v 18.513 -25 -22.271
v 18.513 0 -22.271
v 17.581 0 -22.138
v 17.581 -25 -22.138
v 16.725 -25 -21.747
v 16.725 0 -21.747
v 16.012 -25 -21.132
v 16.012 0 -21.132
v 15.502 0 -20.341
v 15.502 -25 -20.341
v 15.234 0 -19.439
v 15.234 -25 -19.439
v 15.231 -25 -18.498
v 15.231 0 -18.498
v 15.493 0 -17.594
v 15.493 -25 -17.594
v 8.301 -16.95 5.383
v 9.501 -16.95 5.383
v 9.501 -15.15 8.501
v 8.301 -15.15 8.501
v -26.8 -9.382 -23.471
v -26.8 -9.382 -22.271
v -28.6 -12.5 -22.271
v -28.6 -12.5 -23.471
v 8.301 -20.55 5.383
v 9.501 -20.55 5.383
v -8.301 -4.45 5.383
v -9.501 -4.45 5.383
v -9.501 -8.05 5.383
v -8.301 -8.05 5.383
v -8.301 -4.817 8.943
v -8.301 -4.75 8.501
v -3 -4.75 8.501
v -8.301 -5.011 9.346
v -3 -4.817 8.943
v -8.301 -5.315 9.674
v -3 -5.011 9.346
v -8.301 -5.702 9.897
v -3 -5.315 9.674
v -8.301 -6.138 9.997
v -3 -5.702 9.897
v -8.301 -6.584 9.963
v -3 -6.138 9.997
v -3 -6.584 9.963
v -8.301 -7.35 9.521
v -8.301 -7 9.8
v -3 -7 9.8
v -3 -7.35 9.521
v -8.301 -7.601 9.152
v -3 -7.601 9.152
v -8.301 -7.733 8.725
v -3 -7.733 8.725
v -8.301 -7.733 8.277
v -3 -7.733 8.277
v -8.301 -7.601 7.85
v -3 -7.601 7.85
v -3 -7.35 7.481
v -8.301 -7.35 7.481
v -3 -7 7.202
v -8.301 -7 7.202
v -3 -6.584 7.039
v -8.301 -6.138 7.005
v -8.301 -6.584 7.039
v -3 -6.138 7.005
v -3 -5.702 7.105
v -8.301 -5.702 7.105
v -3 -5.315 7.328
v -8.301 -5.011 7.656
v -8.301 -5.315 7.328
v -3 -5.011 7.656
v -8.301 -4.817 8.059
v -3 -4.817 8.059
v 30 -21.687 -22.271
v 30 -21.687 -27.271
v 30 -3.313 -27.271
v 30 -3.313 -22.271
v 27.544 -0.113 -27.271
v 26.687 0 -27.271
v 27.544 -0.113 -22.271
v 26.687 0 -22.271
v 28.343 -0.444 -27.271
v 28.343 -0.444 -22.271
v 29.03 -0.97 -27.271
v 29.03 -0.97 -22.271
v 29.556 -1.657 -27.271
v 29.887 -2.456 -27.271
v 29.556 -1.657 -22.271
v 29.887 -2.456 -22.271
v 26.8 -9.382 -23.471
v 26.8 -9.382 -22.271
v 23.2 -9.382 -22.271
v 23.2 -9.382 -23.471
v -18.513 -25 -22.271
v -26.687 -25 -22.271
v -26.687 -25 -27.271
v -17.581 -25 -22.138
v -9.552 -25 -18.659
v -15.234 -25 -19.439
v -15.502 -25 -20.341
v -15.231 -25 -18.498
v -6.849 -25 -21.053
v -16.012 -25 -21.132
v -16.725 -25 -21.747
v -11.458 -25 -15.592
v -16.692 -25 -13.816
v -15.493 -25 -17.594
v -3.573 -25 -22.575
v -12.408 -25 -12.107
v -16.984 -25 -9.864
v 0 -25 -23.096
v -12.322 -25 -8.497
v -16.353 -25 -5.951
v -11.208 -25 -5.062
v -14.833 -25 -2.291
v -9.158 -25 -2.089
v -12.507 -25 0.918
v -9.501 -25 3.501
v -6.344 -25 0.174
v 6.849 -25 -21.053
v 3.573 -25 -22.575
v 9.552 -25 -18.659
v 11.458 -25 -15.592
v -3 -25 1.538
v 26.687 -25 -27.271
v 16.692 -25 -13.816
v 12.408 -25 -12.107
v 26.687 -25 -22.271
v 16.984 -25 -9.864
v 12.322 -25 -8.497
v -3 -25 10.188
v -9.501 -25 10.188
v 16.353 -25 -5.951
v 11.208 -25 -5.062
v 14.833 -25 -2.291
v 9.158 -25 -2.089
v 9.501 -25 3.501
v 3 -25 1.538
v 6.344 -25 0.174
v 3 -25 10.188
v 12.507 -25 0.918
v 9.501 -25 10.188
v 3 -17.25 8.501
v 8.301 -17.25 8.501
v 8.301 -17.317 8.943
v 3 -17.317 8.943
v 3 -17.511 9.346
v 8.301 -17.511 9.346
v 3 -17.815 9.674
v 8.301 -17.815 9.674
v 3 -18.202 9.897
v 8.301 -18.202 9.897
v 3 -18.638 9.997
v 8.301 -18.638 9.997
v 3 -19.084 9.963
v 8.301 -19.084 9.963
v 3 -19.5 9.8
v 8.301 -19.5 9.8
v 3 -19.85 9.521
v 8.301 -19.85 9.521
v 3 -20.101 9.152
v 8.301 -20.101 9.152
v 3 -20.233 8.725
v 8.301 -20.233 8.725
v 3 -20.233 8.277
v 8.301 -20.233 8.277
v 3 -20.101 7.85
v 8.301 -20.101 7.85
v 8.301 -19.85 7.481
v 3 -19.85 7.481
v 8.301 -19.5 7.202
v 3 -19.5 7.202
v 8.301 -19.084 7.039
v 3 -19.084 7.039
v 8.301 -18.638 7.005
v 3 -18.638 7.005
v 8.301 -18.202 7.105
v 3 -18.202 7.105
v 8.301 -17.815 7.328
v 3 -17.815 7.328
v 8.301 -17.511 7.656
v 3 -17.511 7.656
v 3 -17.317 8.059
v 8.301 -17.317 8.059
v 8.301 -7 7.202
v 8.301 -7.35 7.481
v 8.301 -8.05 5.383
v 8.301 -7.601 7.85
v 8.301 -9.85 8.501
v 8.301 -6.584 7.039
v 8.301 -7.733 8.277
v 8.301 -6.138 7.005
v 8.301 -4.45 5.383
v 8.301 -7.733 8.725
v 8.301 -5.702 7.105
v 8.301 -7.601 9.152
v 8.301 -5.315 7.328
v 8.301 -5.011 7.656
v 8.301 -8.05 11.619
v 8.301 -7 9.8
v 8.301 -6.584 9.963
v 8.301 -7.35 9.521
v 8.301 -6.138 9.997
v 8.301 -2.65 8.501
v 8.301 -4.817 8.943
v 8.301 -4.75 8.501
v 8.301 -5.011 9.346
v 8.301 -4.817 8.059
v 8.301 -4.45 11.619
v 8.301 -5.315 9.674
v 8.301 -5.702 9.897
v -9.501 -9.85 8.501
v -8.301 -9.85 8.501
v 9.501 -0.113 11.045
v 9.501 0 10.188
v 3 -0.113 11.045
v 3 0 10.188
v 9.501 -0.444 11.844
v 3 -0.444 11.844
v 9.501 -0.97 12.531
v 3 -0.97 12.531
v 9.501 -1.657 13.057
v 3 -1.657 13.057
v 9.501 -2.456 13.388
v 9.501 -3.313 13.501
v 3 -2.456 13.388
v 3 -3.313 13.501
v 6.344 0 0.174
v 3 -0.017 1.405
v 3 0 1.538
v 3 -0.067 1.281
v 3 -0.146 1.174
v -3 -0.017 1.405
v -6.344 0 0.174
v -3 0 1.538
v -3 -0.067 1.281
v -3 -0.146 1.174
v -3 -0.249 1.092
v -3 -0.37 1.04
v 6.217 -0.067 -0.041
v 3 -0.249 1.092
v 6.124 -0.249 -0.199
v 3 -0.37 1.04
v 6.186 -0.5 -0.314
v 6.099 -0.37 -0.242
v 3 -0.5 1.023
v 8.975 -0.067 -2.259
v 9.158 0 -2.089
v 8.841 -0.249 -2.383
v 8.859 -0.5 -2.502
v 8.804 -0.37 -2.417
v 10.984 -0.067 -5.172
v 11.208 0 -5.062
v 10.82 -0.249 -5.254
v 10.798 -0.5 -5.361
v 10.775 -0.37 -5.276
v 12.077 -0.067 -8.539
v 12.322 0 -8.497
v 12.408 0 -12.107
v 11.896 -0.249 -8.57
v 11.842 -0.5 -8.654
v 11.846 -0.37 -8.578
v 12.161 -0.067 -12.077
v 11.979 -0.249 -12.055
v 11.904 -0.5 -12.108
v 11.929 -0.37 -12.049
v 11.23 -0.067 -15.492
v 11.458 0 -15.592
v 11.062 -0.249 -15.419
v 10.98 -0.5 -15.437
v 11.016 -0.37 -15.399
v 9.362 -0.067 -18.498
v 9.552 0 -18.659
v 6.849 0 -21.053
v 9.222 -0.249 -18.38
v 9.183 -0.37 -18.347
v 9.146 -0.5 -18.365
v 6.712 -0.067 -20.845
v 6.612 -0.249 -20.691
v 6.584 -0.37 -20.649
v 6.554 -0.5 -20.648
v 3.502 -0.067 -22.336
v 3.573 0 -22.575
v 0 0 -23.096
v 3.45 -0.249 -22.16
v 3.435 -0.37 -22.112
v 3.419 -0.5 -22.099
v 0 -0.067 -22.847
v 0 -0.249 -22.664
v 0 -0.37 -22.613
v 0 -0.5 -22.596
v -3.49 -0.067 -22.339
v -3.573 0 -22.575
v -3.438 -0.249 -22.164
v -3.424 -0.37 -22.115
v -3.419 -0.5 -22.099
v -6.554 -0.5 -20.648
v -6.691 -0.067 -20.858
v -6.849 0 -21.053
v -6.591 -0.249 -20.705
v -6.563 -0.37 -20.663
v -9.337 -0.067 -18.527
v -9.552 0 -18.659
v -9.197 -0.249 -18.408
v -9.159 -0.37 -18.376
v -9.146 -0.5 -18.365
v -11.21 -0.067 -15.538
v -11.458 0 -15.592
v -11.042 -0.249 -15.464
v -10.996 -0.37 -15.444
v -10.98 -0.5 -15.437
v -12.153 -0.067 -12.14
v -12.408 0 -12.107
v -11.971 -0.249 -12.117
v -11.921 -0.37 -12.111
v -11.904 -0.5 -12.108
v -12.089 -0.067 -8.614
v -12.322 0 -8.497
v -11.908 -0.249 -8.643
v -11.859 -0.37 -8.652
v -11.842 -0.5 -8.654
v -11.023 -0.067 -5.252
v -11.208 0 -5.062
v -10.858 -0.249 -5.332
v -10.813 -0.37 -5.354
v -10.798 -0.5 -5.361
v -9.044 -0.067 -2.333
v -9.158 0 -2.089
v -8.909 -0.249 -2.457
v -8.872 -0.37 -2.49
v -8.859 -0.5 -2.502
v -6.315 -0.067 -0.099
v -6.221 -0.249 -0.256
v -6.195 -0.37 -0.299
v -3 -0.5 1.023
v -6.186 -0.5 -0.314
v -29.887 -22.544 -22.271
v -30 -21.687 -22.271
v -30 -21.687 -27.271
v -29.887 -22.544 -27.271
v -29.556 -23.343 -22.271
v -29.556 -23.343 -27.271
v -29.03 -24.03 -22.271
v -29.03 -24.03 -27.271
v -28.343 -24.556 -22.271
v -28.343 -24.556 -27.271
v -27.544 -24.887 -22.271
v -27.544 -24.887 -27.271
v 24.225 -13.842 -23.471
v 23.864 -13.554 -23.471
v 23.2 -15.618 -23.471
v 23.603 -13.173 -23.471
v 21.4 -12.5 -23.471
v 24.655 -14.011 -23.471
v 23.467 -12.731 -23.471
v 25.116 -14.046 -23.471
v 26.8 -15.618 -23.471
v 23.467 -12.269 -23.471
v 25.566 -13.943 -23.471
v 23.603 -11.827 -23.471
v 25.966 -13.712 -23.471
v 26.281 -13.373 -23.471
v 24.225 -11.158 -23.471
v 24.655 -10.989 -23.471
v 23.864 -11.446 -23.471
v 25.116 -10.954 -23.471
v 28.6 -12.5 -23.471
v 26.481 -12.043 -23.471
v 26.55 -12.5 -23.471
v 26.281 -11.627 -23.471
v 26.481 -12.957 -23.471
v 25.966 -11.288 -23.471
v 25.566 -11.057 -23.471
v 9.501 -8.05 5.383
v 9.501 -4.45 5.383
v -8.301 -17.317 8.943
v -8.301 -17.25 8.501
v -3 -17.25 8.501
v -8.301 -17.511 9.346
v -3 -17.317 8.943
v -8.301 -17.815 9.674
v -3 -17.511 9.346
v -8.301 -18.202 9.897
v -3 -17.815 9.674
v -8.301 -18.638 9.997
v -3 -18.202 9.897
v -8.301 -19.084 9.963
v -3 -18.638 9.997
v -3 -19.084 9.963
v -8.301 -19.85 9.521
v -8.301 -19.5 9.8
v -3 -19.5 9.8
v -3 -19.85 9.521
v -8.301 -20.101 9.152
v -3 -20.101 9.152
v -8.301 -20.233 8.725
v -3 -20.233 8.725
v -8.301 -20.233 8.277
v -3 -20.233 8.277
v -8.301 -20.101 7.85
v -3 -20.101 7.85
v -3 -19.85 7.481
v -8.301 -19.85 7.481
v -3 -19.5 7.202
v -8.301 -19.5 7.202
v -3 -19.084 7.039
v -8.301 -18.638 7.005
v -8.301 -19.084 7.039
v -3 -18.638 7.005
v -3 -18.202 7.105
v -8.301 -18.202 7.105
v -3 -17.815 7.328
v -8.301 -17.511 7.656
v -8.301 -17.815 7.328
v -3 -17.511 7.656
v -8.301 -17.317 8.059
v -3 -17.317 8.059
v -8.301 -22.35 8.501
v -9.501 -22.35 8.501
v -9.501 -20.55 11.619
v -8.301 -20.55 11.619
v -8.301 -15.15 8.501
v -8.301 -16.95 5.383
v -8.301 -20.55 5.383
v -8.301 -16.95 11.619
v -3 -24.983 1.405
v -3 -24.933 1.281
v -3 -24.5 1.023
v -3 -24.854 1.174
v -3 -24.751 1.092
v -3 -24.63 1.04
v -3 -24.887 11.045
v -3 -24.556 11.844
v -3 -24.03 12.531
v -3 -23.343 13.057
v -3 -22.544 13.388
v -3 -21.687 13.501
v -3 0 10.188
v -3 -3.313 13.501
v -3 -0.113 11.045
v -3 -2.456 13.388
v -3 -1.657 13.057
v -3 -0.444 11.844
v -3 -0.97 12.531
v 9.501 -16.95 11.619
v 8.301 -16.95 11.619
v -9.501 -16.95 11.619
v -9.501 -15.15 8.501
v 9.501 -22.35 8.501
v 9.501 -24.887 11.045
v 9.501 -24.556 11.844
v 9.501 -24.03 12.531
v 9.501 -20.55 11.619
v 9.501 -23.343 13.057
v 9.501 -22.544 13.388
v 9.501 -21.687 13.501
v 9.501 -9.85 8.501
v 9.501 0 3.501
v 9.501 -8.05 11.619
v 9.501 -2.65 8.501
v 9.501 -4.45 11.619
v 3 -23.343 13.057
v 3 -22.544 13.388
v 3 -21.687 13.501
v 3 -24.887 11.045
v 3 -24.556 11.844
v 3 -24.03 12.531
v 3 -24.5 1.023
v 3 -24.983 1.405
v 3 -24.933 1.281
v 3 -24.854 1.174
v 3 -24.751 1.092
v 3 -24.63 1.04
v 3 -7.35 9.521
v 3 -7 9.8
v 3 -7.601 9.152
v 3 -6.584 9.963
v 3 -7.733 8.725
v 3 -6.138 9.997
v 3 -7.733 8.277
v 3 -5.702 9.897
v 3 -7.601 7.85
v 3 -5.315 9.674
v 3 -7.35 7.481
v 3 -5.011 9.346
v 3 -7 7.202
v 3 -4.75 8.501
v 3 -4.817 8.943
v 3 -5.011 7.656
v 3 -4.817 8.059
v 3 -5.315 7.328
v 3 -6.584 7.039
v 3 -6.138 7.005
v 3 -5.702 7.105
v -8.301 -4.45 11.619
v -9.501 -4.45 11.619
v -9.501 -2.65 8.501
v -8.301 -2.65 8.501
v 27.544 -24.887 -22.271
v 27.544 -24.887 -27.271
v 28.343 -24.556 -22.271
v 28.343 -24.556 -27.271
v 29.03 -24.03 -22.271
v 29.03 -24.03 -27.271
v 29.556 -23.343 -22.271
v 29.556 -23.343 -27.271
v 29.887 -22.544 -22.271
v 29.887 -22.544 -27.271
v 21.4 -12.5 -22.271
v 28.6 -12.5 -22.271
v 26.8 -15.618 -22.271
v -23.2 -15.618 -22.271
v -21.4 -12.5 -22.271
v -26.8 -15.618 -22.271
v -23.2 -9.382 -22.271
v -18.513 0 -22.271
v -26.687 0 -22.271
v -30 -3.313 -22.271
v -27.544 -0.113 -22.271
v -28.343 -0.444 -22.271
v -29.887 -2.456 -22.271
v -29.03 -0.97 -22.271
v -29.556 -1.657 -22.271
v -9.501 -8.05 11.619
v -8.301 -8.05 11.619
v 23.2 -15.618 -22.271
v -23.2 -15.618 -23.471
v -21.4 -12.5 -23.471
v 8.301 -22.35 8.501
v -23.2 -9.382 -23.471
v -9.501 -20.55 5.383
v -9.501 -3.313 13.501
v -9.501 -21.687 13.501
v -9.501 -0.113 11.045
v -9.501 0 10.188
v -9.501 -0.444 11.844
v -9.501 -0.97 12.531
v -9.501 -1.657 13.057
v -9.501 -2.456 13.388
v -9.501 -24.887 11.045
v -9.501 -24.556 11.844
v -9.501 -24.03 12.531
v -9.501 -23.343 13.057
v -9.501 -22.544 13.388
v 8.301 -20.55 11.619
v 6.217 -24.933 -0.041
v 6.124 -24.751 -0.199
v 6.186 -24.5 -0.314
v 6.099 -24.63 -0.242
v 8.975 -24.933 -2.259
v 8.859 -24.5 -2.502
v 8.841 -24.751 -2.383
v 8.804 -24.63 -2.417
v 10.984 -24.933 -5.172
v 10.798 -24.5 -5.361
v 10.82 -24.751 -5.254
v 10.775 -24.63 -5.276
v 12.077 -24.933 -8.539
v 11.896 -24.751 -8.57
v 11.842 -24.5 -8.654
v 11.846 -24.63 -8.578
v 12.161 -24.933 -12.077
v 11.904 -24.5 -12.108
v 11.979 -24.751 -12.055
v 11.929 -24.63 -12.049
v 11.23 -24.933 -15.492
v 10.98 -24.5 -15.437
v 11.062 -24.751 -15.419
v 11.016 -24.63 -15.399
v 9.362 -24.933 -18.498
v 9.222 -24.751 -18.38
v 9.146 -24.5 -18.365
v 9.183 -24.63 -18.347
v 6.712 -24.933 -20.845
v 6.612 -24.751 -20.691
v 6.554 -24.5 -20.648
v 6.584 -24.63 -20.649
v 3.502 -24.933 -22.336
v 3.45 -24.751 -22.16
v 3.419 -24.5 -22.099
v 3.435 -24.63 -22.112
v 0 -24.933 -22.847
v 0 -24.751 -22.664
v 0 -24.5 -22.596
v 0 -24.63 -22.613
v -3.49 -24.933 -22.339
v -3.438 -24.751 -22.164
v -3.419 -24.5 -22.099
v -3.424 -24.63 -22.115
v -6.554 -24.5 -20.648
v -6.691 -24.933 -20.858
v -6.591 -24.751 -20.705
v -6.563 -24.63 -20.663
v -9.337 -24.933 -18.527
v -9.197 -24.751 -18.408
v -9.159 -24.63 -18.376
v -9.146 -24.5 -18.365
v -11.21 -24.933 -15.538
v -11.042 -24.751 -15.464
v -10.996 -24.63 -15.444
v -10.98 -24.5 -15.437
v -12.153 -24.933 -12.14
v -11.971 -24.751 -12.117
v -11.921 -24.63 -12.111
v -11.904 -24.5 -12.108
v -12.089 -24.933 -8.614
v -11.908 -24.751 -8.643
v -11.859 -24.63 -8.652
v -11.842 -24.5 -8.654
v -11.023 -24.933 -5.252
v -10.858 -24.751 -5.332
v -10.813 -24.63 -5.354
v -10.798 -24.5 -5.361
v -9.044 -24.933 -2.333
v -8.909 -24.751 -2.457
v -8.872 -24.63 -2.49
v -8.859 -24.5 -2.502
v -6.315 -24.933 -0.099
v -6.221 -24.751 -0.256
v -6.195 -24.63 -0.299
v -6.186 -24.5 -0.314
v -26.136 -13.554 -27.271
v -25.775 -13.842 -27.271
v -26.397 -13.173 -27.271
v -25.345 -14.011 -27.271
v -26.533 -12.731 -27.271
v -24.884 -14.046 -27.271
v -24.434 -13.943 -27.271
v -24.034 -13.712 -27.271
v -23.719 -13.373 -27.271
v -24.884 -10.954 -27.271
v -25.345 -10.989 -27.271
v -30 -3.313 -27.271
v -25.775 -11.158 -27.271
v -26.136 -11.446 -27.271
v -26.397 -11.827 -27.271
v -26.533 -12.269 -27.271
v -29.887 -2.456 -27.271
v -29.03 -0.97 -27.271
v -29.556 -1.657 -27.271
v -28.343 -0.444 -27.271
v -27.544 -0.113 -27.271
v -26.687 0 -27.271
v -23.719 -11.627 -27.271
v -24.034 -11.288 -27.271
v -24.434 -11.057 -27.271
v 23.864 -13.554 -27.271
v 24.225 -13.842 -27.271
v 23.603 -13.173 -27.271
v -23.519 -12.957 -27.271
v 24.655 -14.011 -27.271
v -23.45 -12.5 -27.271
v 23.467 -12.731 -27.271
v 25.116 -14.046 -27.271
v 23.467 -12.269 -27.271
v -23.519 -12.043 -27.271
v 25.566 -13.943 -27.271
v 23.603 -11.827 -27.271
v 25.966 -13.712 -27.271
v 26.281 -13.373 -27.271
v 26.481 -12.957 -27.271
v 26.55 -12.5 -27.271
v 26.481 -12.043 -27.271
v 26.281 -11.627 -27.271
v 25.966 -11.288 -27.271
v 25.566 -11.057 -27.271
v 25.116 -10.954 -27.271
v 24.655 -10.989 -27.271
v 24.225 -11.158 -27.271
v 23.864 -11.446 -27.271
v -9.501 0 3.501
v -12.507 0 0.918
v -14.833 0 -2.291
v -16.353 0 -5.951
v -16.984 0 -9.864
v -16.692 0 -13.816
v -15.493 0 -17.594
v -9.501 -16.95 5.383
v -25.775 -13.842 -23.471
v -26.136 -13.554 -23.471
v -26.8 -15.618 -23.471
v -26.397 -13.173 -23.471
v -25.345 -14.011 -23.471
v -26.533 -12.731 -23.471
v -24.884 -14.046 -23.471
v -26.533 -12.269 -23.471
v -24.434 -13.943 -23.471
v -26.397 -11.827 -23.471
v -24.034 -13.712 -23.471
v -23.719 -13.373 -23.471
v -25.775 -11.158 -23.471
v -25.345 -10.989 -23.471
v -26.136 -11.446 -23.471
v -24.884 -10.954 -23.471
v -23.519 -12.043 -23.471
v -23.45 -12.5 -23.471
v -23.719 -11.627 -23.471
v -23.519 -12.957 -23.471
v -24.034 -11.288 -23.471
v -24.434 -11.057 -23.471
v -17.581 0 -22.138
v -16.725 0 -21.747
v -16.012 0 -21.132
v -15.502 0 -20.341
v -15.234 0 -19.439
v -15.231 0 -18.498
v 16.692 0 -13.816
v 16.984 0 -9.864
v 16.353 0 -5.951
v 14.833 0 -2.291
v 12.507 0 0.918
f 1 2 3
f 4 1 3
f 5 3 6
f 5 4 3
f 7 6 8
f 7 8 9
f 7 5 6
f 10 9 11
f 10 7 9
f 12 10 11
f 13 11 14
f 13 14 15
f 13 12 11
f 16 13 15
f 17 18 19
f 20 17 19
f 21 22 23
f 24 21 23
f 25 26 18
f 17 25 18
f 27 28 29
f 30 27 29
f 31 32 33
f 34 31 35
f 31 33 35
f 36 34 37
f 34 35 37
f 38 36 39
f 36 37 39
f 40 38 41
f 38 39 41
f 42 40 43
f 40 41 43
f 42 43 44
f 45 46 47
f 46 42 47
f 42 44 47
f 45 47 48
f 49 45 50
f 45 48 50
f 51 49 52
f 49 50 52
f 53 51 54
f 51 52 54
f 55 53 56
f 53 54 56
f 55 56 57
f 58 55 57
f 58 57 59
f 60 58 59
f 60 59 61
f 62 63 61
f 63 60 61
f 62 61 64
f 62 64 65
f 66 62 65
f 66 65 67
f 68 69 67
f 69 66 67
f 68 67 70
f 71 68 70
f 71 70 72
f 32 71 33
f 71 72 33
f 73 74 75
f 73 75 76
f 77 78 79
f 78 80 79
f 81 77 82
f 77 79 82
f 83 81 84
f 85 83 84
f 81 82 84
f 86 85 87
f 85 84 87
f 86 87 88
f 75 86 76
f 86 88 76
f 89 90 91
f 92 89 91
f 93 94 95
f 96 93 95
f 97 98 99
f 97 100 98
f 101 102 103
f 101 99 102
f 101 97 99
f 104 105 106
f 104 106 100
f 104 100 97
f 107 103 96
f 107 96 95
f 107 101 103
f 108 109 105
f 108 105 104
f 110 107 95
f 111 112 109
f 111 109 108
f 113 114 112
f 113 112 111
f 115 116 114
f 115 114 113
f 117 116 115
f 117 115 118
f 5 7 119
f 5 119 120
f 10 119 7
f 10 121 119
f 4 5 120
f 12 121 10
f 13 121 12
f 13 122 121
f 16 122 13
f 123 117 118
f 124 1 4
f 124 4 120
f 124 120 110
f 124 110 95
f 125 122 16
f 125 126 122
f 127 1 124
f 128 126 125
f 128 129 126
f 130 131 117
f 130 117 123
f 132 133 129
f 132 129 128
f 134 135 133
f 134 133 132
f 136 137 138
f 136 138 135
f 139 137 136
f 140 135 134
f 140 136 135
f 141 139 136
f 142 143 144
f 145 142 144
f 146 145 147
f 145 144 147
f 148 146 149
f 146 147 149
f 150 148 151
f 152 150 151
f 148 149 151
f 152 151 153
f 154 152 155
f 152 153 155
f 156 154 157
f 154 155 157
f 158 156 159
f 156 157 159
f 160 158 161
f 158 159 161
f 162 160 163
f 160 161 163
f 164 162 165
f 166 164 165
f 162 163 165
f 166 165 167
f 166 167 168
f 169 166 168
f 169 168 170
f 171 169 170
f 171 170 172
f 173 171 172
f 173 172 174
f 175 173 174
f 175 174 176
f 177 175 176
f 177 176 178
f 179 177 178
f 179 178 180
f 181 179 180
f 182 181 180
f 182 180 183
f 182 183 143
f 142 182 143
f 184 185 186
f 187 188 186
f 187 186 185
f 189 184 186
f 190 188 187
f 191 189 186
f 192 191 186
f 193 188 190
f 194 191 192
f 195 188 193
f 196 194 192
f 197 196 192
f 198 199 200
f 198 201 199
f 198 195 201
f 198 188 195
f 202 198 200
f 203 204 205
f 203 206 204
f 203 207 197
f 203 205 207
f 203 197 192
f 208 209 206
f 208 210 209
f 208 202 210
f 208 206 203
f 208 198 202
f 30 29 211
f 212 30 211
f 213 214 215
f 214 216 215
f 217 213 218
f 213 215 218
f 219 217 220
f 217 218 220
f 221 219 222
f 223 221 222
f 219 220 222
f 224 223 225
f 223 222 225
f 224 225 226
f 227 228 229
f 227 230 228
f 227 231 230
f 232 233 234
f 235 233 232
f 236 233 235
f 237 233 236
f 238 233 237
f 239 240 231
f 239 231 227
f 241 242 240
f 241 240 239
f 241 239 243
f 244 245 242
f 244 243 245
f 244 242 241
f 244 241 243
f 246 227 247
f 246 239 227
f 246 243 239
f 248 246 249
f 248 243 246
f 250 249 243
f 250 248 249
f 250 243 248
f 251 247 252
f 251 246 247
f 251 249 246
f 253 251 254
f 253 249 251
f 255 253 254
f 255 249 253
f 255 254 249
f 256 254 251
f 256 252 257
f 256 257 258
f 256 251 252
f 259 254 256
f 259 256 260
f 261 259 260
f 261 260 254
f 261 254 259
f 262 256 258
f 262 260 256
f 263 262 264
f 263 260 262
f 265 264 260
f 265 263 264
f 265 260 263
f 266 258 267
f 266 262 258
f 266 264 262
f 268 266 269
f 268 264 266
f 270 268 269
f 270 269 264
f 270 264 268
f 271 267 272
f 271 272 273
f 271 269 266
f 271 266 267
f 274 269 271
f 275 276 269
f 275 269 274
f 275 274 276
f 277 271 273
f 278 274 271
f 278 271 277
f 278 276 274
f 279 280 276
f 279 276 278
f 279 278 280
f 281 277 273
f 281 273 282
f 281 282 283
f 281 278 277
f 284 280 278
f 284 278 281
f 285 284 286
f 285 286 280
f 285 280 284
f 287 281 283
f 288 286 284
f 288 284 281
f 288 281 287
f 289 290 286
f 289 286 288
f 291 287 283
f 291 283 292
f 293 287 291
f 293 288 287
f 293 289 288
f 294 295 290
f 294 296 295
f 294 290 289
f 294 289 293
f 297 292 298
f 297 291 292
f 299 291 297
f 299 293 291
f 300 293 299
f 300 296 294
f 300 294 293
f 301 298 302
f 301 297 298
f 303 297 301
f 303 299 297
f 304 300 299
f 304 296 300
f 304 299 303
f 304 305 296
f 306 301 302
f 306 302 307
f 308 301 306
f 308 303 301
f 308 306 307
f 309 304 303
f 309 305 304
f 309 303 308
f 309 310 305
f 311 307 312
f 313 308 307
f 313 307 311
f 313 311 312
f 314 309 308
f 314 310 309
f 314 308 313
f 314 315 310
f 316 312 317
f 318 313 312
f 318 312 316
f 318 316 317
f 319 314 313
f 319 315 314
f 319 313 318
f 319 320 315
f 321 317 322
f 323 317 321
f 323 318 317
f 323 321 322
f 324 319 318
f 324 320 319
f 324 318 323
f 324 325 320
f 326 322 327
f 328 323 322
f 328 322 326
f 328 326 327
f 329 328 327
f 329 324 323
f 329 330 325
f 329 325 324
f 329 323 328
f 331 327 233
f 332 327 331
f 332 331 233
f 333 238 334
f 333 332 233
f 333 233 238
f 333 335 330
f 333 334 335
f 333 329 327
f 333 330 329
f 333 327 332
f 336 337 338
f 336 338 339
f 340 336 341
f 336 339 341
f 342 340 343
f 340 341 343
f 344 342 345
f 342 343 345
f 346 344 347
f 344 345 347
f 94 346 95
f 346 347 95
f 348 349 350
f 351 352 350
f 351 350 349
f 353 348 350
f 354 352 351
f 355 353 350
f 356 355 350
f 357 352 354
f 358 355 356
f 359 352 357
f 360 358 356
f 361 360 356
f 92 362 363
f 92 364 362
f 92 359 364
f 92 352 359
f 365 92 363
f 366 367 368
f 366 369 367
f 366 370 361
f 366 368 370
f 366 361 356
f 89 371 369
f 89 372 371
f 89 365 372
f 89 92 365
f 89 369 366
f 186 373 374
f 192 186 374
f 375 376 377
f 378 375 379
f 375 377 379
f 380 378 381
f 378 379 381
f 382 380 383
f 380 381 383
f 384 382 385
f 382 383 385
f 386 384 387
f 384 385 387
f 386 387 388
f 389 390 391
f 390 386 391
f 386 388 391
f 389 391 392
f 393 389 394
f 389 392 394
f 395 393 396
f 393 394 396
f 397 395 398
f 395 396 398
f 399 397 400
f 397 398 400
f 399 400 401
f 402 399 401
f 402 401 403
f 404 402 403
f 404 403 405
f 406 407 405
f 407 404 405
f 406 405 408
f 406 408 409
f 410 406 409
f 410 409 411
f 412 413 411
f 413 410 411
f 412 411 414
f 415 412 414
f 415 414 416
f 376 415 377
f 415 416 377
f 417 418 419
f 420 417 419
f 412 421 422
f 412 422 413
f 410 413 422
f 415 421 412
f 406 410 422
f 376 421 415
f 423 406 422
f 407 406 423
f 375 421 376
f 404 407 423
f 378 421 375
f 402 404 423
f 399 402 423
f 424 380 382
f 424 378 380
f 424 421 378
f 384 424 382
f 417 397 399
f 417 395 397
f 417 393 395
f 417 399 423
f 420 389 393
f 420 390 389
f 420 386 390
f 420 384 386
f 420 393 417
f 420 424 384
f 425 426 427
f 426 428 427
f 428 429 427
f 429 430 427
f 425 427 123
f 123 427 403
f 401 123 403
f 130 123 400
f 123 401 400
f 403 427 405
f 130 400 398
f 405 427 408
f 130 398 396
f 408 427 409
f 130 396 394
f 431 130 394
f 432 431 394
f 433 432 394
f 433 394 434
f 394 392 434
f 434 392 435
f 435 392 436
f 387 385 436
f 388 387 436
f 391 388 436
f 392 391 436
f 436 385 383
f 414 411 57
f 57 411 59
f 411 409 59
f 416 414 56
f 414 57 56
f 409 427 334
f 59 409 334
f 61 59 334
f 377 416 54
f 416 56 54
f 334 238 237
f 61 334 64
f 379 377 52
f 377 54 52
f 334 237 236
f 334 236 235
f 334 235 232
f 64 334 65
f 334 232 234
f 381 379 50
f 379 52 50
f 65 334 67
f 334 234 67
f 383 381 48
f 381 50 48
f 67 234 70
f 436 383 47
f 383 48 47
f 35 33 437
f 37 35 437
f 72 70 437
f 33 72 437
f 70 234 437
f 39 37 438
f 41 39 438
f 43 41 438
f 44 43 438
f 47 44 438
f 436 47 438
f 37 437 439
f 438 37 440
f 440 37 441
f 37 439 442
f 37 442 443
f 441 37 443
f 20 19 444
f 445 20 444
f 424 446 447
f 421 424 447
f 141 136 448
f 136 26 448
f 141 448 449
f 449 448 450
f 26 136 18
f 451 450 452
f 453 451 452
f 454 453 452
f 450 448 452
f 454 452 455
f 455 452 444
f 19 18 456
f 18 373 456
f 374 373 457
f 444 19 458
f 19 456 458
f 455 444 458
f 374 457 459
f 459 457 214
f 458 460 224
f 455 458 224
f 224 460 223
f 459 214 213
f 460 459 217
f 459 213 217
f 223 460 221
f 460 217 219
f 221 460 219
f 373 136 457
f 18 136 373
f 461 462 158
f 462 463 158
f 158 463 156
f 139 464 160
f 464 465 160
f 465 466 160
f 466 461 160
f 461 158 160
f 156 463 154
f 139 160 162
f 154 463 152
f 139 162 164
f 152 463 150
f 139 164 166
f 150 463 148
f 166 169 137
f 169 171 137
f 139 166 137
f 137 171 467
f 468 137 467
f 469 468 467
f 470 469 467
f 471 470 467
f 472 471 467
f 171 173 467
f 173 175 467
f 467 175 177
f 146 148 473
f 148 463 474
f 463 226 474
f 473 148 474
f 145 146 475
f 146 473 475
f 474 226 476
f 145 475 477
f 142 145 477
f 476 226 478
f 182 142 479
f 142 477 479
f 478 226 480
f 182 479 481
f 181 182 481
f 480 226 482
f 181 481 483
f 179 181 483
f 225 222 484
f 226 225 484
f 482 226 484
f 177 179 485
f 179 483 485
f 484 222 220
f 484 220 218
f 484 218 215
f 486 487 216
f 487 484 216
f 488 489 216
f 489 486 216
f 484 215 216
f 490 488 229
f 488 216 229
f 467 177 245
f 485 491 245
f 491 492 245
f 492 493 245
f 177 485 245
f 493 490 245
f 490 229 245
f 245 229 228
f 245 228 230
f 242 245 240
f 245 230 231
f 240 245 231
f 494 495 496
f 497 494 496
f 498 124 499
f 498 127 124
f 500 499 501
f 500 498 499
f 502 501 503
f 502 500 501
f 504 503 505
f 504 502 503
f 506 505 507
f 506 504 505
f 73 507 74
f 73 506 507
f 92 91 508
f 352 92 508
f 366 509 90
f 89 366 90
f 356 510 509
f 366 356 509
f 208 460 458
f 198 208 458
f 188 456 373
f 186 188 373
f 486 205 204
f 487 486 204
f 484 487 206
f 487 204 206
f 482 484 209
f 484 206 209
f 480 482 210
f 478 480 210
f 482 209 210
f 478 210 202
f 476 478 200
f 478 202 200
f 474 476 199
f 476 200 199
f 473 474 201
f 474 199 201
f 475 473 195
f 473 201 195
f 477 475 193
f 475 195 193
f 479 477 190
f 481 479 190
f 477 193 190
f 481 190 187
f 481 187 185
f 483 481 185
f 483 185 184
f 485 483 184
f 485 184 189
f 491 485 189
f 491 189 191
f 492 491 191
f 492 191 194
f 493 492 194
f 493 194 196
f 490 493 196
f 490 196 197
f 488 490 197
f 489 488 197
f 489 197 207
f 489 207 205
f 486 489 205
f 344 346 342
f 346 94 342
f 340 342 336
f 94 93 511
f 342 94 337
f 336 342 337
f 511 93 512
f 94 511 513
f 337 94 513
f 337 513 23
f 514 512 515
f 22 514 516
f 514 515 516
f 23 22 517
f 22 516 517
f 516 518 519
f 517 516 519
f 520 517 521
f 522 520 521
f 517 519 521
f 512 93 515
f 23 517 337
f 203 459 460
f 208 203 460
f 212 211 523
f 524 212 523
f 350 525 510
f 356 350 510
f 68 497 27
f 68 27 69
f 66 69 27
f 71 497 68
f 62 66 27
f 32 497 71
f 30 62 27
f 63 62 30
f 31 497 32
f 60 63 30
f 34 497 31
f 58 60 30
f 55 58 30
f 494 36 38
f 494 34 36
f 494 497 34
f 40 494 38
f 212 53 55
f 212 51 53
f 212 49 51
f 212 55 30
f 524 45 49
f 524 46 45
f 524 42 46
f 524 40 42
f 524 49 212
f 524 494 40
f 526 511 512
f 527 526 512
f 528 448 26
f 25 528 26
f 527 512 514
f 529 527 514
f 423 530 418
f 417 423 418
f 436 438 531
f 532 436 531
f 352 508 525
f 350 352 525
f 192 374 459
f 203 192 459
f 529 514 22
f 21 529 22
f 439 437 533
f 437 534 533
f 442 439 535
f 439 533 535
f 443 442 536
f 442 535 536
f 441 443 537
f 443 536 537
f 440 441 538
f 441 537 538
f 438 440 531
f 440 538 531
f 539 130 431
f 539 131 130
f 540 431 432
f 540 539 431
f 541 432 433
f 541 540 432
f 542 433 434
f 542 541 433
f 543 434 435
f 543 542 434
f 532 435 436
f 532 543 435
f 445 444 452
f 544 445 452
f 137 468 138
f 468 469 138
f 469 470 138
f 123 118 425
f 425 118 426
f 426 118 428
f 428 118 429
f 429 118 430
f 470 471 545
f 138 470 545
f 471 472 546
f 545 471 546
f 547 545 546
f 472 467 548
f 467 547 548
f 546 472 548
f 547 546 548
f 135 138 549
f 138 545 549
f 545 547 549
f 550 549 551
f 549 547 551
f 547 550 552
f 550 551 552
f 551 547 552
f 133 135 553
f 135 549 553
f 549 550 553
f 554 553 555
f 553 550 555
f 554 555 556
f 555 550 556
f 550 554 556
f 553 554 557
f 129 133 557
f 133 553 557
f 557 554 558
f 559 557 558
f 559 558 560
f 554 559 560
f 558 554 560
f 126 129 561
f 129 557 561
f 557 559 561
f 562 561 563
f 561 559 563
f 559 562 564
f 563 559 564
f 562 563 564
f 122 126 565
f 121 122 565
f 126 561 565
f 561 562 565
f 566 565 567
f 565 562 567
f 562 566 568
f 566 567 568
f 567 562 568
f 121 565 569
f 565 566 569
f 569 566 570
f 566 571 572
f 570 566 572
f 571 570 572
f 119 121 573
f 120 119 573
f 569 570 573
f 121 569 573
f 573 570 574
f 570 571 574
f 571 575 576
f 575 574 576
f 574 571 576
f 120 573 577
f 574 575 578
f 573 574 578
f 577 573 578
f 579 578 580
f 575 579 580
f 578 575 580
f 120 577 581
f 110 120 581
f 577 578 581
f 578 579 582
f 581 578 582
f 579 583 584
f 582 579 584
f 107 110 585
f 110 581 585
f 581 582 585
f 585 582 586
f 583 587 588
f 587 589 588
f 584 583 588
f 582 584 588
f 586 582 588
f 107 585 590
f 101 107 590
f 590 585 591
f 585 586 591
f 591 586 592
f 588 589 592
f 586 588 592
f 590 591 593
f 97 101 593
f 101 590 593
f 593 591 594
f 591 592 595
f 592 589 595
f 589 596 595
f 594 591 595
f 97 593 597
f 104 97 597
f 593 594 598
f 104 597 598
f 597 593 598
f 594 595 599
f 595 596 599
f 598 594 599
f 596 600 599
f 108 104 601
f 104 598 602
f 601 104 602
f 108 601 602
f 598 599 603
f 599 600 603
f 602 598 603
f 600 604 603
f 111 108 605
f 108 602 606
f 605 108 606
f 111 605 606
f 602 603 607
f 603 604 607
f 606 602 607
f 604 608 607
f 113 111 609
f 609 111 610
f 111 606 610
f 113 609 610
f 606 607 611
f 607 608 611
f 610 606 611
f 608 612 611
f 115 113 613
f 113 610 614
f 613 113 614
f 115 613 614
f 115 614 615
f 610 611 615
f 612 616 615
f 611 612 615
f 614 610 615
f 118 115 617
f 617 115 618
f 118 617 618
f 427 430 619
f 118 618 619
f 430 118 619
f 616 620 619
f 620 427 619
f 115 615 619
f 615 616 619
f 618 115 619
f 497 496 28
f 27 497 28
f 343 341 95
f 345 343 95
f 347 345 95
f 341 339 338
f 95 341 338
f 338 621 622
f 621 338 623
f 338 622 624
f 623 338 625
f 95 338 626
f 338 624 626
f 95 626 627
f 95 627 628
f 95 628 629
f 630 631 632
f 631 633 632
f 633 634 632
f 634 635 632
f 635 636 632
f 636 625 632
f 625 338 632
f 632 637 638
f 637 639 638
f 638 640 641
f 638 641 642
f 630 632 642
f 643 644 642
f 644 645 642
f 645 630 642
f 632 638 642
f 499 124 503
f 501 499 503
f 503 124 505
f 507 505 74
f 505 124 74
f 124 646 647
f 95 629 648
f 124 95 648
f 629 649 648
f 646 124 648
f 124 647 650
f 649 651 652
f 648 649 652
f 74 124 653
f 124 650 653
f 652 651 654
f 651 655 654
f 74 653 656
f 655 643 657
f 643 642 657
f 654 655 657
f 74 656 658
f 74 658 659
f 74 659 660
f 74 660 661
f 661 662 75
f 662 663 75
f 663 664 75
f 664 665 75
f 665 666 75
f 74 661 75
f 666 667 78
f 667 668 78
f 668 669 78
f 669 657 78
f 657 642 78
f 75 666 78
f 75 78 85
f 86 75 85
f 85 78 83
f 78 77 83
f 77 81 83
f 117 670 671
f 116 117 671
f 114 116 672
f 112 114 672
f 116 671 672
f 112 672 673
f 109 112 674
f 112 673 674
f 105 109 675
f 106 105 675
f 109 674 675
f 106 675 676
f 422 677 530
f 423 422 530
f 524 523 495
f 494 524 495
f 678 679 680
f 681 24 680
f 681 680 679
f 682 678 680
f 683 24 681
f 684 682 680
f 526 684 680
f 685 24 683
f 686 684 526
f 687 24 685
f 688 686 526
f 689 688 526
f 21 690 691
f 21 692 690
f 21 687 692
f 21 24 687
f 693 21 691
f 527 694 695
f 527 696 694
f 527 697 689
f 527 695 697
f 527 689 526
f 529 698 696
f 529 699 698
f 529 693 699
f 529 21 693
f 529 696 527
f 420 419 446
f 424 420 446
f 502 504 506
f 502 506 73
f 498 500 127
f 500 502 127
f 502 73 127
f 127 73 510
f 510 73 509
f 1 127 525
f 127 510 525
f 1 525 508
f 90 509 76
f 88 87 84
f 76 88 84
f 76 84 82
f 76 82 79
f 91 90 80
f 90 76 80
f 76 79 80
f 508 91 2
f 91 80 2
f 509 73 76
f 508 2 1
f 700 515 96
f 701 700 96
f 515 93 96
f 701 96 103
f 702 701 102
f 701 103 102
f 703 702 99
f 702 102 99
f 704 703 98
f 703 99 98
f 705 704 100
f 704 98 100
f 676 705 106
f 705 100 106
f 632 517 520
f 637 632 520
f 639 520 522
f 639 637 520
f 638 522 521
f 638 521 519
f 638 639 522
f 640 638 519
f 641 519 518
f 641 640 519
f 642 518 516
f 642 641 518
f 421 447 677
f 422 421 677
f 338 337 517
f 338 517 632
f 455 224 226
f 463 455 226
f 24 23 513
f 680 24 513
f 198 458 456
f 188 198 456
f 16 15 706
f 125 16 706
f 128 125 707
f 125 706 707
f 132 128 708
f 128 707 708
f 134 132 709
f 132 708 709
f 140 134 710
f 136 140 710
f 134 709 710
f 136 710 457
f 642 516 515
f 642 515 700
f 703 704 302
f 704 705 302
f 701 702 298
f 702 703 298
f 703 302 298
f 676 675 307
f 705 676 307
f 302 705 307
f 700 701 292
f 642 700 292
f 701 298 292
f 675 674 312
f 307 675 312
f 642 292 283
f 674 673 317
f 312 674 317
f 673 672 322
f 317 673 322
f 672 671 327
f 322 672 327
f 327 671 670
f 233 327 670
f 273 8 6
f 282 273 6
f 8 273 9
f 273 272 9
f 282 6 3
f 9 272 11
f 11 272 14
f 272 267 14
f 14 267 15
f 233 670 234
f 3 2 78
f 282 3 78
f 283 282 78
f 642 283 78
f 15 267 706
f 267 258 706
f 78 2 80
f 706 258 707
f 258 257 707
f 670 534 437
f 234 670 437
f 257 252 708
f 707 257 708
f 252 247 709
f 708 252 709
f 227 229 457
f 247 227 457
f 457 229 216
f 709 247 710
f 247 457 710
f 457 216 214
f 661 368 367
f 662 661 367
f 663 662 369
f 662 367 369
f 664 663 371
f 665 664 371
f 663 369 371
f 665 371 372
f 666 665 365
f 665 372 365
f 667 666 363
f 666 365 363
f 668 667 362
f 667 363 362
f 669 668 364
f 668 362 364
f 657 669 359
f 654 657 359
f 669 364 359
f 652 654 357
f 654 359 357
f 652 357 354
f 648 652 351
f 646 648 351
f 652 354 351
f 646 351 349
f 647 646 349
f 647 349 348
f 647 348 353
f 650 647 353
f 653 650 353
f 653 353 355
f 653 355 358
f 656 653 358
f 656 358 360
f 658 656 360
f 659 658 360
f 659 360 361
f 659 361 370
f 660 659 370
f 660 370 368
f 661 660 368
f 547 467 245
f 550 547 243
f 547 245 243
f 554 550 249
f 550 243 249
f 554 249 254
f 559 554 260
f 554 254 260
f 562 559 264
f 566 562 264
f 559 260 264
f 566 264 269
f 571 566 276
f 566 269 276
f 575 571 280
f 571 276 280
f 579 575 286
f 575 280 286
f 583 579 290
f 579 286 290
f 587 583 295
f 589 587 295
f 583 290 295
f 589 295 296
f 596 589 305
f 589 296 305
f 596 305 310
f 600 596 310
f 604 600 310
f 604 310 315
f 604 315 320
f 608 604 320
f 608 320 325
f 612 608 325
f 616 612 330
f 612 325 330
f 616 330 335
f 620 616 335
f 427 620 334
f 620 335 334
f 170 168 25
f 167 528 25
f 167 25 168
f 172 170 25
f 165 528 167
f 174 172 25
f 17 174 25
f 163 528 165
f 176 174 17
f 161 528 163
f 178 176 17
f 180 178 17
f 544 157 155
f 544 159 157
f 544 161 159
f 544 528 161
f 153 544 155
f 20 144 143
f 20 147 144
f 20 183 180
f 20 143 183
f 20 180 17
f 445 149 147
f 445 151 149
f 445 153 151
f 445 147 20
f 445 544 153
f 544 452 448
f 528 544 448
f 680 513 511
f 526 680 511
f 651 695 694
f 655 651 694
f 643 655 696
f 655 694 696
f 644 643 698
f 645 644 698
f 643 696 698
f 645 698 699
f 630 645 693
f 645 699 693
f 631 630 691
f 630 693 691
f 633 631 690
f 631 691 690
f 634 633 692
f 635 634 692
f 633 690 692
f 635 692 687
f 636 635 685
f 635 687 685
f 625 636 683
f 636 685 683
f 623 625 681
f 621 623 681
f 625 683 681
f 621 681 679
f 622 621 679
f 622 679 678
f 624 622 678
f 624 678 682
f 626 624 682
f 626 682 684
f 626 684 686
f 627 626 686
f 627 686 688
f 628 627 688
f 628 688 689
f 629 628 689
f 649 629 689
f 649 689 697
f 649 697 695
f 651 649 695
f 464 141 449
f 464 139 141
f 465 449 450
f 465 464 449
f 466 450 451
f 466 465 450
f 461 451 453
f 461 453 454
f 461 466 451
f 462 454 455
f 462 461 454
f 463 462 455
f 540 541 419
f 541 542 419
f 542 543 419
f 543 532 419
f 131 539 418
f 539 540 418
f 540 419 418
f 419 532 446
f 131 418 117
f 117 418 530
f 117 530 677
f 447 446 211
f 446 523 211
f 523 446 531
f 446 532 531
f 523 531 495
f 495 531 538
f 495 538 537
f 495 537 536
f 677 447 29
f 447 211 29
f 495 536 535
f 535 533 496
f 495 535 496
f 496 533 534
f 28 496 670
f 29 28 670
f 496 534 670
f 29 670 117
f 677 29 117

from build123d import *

# Parameters (mm, degrees)
F1_DEPTH  = 25
F2_R      = 1.55
F3_DEPTH  = 25
F4_R      = 1.5
F5_DEPTH  = 25
F6_R      = 3.3134143982
F9_DEPTH  = 1.2
F8_R      = 1.5
F10_DEPTH = 1.2
F12_DEPTH = 1.2
F13_R     = 0.5


# Not quite as in the source:
# - ends of sketch curves that miss each other by under 0.0002 mm in the source are joined


with BuildPart() as f1:
    # F0 (on Front) → F1 (new body)
    with BuildSketch(Plane.XZ):
        with BuildLine():
            Line((-30, -27.2712218283), (30, -27.271222222))
            Line((30, -27.271222222), (30, -22.271222222))
            Line((30, -22.271222222), (12.3570600307, -22.2712218283))
            ThreePointArc((12.3570600307, -22.2712218283), (16.8965495982, -8.7237267257), (9.5007861894, 3.5010134632))
            Line((9.5007861894, 3.5010134632), (9.5007861894, 13.5010134632))
            Line((9.5007861894, 13.5010134632), (3, 13.5010134632))
            Line((3, 13.5010134632), (3, 6.1368714524))
            Line((3, 6.1368714524), (3, 4.8868714524))
            Line((3, 4.8868714524), (3, 1.0226200218))
            ThreePointArc((3, 1.0226200218), (0, -22.5963300169), (-3, 1.0226200218))
            Line((-3, 1.0226200218), (-3, 4.8868714524))
            Line((-3, 4.8868714524), (-3, 13.5010134632))
            Line((-3, 13.5010134632), (-9.5007861894, 13.5010134632))
            Line((-9.5007861894, 13.5010134632), (-9.5007861894, 3.5010134632))
            ThreePointArc((-9.5007861894, 3.5010134632), (-16.8965495982, -8.7237267257), (-12.3570600307, -22.2712218283))
            Line((-12.3570600307, -22.2712218283), (-30, -22.2712218283))
            Line((-30, -22.2712218283), (-30, -27.2712218283))
        make_face()
    extrude(amount=F1_DEPTH)

    # F2 (on face) → F3 (cut)
    with BuildSketch(Plane.XY.offset(-22.2712218283)):
        with Locations((-25, -12.5)):
            Circle(F2_R)
        with Locations((25, -12.5)):
            Circle(F2_R)
    extrude(amount=-F3_DEPTH, mode=Mode.SUBTRACT)

    # F4 (on face) → F5 (cut)
    with BuildSketch(Plane.YZ.offset(9.5007861894)):
        with Locations((-18.75, 8.5010134632)):
            Circle(F4_R)
        with Locations((-6.25, 8.5010134632)):
            Circle(F4_R)
    extrude(amount=-F5_DEPTH, mode=Mode.SUBTRACT)

    # F6
    f6_edges = [f1.edges().sort_by_distance(p)[0] for p in [
        (-6.250393, -25, 13.501013),
        (6.250393, -25, 13.501013),
        (-6.250393, 0, 13.501013),
        (6.250393, 0, 13.501013),
        (30, -25, -24.771222),
        (30, 0, -24.771222),
        (-30, 0, -24.771222),
        (-30, -25, -24.771222),
        (12.35706, -12.5, -22.271222),
        (-12.35706, -12.5, -22.271222),
    ]]
    fillet(f6_edges, radius=F6_R)

    # F7 (on face) → F9 (cut)
    with BuildSketch(Plane.YZ.offset(9.5007861894)):
        Polygon((-20.55, 5.3833220096), (-16.95, 5.3833220096), (-15.15, 8.5010134632), (-16.95, 11.6187049168), (-20.55, 11.6187049168), (-22.35, 8.5010134632), align=None)
        Polygon((-4.45, 11.6187049168), (-8.05, 11.6187049168), (-9.85, 8.5010134632), (-8.05, 5.3833220096), (-4.45, 5.3833220096), (-2.65, 8.5010134632), align=None)
    extrude(amount=-F9_DEPTH, mode=Mode.SUBTRACT)

    # F8 (on face) → F10 (cut)
    with BuildSketch(Plane(origin=(-9.5007861894, 0, 0), x_dir=(0, -1, 0), z_dir=(-1, 0, 0))):
        Polygon((4.45, 5.3833220096), (8.05, 5.3833220096), (9.85, 8.5010134632), (8.05, 11.6187049168), (4.45, 11.6187049168), (2.65, 8.5010134632), align=None)
        with Locations((6.25, 8.5010134632)):
            Circle(F8_R, mode=Mode.SUBTRACT)
        Polygon((20.55, 11.6187049168), (16.95, 11.6187049168), (15.15, 8.5010134632), (16.95, 5.3833220096), (20.55, 5.3833220096), (22.35, 8.5010134632), align=None)
        with Locations((18.75, 8.5010134632)):
            Circle(F8_R, mode=Mode.SUBTRACT)
    extrude(amount=-F10_DEPTH, mode=Mode.SUBTRACT)

    # F11 (on face) → F12 (cut)
    with BuildSketch(Plane.XY.offset(-22.2712218283)):
        Polygon((26.8, -9.3823085464), (23.2, -9.3823085464), (21.4, -12.5), (23.2, -15.6176914536), (26.8, -15.6176914536), (28.6, -12.5), align=None)
        Polygon((-23.2, -15.6176914536), (-21.4, -12.5), (-23.2, -9.3823085464), (-26.8, -9.3823085464), (-28.6, -12.5), (-26.8, -15.6176914536), align=None)
    extrude(amount=-F12_DEPTH, mode=Mode.SUBTRACT)

    # F13
    f13_edges = [f1.edges().sort_by_distance(p)[0] for p in [
        (0, 0, -22.59633),
        (0, -25, -22.59633),
    ]]
    fillet(f13_edges, radius=F13_R)


solid = f1.part
